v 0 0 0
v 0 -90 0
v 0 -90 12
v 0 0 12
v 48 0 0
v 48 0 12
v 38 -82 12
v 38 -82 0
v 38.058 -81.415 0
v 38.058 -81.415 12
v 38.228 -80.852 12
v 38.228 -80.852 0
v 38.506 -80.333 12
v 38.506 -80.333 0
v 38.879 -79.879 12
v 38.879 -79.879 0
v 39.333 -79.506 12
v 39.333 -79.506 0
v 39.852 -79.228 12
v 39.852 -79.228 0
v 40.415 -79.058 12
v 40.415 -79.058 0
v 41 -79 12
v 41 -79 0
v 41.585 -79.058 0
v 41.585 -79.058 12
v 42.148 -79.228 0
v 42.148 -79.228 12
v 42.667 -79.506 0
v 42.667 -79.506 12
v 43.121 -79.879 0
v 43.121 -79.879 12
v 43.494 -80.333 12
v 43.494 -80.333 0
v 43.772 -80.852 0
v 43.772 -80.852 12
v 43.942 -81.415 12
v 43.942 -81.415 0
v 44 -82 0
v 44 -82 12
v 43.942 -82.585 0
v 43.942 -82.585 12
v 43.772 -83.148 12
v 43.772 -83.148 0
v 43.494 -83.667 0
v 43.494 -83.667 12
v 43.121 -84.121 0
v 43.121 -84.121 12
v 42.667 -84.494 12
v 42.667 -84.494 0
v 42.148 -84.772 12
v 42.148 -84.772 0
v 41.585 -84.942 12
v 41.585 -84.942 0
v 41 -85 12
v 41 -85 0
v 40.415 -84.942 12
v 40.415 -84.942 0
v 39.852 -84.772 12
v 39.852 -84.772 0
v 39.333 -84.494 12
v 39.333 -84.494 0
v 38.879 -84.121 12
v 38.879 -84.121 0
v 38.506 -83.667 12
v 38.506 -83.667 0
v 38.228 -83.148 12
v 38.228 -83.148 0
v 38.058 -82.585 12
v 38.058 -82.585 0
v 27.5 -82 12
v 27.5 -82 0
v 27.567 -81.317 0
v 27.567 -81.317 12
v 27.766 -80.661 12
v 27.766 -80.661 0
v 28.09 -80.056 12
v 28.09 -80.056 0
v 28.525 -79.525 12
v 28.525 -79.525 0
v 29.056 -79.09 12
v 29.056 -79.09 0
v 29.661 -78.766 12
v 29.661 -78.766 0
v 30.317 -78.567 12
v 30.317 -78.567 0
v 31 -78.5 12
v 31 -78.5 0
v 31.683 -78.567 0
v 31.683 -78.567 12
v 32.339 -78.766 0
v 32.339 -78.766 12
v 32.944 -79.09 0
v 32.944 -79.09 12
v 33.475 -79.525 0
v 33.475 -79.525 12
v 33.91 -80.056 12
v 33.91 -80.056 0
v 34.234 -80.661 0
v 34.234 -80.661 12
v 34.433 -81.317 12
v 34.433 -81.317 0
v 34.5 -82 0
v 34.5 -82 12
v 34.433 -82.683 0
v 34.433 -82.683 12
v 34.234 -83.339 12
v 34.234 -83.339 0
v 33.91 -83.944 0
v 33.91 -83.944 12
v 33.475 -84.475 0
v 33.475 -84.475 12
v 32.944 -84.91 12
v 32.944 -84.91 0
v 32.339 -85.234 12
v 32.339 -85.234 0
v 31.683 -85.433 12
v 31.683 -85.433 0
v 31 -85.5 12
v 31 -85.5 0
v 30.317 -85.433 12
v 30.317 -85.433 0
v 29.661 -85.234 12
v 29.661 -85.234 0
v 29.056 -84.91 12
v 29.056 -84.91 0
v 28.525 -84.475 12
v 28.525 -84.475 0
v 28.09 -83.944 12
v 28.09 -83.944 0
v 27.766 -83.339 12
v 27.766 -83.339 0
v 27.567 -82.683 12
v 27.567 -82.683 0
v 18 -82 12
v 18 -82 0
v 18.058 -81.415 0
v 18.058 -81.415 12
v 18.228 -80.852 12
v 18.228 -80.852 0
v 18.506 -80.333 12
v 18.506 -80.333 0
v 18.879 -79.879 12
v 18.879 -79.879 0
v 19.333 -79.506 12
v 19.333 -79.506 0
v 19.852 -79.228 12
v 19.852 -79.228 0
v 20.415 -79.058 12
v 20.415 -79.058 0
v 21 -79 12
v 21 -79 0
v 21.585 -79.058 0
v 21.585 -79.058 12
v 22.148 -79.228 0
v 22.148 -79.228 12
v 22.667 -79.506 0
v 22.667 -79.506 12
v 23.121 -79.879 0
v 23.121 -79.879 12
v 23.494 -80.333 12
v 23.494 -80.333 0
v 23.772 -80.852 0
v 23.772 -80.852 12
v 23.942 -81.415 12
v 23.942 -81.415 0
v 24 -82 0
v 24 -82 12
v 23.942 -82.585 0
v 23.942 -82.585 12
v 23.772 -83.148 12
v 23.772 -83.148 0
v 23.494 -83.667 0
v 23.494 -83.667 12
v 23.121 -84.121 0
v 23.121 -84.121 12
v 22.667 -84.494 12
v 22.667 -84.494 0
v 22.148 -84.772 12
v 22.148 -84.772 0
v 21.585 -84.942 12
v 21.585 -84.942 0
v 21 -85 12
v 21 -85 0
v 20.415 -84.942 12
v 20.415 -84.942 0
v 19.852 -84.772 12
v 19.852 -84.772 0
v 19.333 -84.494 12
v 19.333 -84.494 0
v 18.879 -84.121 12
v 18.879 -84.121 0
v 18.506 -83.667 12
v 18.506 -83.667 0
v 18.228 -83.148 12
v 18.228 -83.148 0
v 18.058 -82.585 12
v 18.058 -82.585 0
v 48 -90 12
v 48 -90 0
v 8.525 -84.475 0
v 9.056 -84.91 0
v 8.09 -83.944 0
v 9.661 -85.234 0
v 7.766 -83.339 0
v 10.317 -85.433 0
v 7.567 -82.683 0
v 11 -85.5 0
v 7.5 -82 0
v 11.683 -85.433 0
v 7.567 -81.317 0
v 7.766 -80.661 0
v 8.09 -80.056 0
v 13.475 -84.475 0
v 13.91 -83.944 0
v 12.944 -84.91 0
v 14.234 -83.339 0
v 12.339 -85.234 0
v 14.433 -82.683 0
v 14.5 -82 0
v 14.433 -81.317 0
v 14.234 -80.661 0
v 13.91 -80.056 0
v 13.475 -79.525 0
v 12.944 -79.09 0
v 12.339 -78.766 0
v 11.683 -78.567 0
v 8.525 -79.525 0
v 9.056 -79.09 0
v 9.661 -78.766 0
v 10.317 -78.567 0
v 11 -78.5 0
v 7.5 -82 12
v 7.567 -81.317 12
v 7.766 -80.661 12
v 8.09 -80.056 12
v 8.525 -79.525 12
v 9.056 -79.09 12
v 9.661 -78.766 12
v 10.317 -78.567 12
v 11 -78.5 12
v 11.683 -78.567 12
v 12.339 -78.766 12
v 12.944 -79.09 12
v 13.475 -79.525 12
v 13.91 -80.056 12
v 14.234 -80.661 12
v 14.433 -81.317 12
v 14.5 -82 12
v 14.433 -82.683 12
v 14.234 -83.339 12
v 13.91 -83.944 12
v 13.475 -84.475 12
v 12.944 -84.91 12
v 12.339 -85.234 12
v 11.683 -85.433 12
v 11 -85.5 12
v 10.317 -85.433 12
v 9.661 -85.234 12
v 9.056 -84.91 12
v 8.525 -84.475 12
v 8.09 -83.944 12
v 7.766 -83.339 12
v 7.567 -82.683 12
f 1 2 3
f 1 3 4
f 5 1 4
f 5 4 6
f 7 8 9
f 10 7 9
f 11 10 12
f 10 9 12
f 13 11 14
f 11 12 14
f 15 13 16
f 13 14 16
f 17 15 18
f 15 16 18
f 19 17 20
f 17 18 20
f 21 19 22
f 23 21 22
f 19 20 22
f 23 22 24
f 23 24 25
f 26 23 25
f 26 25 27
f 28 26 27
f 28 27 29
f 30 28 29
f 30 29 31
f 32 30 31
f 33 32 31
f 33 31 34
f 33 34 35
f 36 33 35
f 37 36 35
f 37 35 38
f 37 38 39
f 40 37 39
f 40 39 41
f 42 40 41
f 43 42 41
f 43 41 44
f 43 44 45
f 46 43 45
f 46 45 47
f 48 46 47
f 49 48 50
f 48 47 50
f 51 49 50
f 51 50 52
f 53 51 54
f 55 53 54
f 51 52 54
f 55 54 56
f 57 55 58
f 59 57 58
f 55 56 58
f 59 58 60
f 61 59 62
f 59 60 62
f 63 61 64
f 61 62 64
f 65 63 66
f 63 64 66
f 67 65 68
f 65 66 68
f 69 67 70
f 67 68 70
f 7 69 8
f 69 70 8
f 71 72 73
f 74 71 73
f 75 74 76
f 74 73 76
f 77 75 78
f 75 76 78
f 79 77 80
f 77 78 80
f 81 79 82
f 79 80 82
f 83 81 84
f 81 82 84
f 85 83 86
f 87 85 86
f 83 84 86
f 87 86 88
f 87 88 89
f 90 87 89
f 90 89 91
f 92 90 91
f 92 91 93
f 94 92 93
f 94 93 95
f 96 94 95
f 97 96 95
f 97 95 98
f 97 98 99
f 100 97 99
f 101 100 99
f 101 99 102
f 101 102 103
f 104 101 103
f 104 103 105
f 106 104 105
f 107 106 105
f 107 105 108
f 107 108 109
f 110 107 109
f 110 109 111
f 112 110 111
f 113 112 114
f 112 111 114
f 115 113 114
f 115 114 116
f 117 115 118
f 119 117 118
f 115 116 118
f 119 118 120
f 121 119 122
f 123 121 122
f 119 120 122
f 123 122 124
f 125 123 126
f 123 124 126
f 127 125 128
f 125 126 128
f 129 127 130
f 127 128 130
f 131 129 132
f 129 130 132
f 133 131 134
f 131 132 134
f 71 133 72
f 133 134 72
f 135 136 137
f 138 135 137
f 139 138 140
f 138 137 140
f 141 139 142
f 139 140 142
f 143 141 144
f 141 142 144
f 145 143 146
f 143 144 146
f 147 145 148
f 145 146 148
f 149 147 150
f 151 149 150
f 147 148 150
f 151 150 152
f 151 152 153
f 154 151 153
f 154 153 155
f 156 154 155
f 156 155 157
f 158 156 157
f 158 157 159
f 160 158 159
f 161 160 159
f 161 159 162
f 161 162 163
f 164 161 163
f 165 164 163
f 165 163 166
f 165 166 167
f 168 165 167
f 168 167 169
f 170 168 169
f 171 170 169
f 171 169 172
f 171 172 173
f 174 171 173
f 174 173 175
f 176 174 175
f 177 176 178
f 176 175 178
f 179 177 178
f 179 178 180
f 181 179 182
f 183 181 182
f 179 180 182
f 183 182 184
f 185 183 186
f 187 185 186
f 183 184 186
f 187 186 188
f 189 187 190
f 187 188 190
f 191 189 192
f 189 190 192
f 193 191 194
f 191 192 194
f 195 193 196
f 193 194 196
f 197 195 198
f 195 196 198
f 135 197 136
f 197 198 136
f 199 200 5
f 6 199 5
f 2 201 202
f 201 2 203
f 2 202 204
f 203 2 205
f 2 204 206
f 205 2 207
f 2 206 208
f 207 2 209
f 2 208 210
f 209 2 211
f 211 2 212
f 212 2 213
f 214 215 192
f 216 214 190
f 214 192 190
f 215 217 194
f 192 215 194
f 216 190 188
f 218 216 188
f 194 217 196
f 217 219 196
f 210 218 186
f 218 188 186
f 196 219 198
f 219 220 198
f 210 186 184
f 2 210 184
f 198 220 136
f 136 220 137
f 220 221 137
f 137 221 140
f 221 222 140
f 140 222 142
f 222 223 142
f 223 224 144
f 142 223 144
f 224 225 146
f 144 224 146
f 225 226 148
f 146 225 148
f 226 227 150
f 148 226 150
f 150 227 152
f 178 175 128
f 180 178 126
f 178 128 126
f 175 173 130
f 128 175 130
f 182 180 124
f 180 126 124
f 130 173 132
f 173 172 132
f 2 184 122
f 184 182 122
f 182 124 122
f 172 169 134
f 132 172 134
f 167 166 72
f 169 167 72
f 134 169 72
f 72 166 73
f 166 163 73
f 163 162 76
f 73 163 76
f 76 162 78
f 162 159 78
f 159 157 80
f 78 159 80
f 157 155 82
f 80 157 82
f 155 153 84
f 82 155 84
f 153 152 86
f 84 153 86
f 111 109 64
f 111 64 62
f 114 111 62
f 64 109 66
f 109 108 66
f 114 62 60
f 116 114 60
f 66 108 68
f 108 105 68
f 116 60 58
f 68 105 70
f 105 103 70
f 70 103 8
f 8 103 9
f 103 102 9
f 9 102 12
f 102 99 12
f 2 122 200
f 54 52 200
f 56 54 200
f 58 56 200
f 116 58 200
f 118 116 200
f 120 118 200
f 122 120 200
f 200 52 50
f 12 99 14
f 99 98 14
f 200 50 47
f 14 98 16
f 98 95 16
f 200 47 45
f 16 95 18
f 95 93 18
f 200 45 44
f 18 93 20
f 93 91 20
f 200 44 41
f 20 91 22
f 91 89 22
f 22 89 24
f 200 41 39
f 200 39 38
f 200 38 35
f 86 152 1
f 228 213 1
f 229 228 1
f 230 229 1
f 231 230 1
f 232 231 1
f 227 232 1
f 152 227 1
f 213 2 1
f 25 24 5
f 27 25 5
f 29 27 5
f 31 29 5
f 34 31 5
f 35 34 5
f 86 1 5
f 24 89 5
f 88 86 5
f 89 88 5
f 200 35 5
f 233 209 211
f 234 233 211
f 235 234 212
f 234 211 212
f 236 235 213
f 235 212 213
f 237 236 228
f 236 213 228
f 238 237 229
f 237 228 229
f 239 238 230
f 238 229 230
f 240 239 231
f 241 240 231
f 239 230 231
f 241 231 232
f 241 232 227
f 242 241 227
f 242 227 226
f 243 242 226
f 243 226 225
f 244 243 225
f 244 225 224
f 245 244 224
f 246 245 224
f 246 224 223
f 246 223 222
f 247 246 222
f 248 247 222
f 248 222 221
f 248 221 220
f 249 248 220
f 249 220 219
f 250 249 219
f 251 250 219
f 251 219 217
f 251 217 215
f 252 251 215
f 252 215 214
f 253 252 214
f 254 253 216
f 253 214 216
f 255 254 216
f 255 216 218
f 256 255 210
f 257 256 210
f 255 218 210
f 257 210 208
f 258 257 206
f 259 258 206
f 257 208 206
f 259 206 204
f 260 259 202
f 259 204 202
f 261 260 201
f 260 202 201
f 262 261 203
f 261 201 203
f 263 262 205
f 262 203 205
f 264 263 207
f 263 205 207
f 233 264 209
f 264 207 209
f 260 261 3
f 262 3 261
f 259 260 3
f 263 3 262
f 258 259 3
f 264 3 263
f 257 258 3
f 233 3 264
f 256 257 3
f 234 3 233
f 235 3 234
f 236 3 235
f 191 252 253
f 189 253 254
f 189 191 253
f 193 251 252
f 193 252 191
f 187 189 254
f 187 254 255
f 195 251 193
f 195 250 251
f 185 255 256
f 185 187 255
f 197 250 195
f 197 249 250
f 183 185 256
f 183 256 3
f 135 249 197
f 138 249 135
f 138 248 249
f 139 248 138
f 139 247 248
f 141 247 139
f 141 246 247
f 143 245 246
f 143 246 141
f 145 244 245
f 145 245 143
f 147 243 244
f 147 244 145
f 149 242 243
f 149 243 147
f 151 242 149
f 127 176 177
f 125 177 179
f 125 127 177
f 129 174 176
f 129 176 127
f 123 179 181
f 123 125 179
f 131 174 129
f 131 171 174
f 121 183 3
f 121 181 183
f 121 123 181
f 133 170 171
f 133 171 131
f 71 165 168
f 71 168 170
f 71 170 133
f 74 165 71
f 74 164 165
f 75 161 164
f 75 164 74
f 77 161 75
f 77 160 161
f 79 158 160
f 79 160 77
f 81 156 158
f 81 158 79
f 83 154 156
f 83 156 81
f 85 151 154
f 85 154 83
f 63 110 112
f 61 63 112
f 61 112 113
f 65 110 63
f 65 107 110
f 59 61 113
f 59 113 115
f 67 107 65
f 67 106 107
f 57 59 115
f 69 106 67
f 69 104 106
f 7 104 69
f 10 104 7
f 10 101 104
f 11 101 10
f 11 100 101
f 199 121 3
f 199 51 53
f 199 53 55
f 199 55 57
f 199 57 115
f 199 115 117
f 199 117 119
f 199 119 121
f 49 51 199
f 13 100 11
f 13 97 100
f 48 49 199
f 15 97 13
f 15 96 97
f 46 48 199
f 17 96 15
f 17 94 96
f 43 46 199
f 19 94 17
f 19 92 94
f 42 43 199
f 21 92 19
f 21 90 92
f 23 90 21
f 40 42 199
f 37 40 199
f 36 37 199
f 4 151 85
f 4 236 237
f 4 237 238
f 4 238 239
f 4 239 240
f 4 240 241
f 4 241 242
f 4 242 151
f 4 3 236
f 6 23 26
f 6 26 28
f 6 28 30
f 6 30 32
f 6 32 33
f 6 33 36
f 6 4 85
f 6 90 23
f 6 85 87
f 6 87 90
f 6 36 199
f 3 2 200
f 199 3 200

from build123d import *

# Parameters (mm, degrees)
F0_W     = 48
F0_H     = 90
F1_DEPTH = 12
F3_D     = 7
F3_DEPTH = 12
F4_D     = 6
F4_DEPTH = 12


with BuildPart() as f1:
    # F0 (on Top) → F1 (new body)
    with BuildSketch(Plane.XY):
        with Locations((24, -45)):
            Rectangle(F0_W, F0_H)
    extrude(amount=F1_DEPTH)

    # F3
    with Locations(Plane.XY.offset(12)):
        with Locations((11, -82), (31, -82)):
            Hole(F3_D / 2, depth=F3_DEPTH)

    # F4
    with Locations(Plane.XY.offset(12)):
        with Locations((21, -82), (41, -82)):
            Hole(F4_D / 2, depth=F4_DEPTH)


solid = f1.part
